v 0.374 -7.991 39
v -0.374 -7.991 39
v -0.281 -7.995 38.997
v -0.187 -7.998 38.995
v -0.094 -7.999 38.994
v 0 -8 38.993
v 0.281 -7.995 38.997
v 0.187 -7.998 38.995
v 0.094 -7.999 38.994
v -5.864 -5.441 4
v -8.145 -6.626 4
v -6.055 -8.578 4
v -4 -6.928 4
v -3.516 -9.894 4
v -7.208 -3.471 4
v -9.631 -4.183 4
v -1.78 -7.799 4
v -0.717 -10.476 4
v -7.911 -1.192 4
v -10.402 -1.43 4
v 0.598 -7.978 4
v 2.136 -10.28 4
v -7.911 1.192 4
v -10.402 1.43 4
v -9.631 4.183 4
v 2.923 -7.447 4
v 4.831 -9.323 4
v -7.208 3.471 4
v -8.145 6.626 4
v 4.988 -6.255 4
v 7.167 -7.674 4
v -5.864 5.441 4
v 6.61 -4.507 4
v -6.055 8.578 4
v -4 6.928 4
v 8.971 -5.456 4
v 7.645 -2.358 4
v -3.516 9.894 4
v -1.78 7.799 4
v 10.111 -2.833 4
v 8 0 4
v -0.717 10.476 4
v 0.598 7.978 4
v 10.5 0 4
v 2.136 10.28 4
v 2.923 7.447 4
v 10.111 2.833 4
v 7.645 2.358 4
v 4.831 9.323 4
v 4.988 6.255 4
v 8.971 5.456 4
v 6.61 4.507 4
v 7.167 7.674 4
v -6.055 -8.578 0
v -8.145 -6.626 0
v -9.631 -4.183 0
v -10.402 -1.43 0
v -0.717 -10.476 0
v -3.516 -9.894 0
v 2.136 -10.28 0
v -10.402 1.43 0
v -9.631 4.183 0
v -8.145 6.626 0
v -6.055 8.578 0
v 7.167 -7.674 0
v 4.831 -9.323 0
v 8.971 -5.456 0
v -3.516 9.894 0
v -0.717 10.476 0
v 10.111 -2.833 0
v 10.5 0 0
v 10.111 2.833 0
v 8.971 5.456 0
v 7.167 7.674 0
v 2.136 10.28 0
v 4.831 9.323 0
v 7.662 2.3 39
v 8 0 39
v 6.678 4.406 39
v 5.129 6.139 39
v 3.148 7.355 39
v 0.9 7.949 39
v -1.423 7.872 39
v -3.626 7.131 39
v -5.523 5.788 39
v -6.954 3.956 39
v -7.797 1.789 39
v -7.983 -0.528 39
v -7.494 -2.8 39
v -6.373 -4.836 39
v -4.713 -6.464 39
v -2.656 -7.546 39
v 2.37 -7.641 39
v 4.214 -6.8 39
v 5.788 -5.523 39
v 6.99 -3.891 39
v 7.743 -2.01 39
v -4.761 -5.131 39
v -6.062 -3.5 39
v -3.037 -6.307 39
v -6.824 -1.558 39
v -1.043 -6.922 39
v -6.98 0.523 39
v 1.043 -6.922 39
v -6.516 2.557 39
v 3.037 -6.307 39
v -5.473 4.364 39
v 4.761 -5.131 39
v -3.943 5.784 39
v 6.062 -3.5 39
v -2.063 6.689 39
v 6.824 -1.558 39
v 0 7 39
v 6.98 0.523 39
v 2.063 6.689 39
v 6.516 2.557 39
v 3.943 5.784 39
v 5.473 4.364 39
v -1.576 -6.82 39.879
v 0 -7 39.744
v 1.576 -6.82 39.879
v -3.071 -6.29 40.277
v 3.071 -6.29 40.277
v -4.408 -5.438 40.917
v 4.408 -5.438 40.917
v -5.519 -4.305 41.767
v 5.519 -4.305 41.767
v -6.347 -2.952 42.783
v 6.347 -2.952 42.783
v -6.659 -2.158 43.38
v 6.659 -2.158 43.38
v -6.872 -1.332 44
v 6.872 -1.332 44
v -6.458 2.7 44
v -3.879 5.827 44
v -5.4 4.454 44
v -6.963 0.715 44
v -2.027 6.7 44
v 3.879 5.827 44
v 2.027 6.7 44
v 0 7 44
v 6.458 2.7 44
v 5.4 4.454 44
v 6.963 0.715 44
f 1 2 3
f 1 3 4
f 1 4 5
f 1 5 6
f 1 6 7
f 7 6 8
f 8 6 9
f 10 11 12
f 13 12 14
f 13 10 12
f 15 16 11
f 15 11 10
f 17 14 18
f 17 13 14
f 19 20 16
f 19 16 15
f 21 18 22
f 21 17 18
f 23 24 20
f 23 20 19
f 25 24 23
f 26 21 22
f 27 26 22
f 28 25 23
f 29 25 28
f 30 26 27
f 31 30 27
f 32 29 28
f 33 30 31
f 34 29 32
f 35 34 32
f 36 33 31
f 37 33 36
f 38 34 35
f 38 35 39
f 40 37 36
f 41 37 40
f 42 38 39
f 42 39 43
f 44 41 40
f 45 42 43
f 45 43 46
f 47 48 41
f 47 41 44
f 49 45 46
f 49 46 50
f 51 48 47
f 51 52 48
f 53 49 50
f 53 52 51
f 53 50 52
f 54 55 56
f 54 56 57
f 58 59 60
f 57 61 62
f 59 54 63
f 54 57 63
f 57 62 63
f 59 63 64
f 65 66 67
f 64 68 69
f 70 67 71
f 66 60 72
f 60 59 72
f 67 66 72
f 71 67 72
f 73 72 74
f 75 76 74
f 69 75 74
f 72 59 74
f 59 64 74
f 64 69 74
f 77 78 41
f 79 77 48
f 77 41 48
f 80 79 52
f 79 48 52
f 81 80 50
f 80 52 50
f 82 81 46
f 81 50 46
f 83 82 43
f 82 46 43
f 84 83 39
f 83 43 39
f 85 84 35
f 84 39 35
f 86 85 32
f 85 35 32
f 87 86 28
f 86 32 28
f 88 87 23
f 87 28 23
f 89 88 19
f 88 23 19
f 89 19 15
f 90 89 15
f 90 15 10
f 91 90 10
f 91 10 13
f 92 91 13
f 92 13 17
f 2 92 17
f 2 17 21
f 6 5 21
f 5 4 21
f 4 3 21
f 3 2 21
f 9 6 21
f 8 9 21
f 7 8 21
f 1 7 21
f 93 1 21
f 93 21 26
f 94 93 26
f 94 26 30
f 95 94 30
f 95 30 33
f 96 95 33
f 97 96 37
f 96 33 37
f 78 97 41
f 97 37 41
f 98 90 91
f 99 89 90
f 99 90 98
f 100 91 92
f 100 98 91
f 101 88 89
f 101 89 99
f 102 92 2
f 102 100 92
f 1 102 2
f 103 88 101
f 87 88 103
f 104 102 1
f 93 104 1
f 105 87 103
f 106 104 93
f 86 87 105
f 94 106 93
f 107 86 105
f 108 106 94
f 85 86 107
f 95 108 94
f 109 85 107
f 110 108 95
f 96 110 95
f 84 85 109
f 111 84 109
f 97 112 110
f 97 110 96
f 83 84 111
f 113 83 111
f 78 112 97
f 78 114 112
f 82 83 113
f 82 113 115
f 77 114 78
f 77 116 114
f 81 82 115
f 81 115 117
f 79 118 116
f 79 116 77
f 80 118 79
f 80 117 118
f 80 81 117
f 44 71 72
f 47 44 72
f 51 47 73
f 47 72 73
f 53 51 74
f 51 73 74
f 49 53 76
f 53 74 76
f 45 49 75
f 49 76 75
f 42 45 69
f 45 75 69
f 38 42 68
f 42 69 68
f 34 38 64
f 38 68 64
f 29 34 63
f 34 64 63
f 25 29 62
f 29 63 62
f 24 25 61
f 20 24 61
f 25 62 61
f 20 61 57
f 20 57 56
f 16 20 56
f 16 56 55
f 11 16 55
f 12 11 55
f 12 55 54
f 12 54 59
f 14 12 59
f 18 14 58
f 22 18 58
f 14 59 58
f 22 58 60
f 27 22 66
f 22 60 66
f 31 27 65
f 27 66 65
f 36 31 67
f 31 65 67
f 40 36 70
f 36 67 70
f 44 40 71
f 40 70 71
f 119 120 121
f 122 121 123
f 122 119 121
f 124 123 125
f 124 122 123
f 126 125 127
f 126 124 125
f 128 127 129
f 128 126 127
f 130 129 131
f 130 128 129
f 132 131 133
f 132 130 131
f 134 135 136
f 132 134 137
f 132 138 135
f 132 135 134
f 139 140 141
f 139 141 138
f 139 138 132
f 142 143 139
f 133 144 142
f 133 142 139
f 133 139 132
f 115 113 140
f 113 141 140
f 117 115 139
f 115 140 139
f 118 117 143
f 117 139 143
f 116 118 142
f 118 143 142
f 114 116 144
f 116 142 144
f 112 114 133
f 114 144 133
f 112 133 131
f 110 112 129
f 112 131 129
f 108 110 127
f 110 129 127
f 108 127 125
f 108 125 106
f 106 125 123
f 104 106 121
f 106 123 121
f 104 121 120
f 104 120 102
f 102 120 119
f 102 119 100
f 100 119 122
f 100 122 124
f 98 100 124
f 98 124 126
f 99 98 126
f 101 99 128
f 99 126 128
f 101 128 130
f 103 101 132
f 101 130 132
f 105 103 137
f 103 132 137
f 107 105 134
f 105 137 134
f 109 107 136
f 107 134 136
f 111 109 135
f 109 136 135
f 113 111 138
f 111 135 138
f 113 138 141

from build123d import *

# Parameters (mm, degrees)
F0_R          = 10.5
F1_DEPTH      = 4
F2_R          = 8
F3_DEPTH      = 39
F4_W          = 7
F4_H          = 5
F7_DEPTH      = 25
F7_DEPTH_BACK = 25


with BuildPart() as f1:
    # F0 (on Top) → F1 (new body)
    with BuildSketch(Plane.XY):
        Circle(F0_R)
    extrude(amount=F1_DEPTH)

    # F2 (on Top) → F3 (join)
    with BuildSketch(Plane.XY):
        Circle(F2_R)
    extrude(amount=F3_DEPTH)

    # F4 (on Right) → F5 (revolve)
    with BuildSketch(Plane.YZ):
        with Locations((3.5, 41.5)):
            Rectangle(F4_W, F4_H)
    revolve(axis=Axis((0, 0, 41.5), (0, 0, -1)))

    # F6 (on Right) → F7 (cut, two sides)
    with BuildSketch(Plane.YZ) as f7_sk:
        Polygon((0, 45), (-8, 45), (-8, 38.993425), align=None)
    extrude(amount=F7_DEPTH, mode=Mode.SUBTRACT)
    extrude(f7_sk.sketch, amount=-F7_DEPTH_BACK, mode=Mode.SUBTRACT)


solid = f1.part
